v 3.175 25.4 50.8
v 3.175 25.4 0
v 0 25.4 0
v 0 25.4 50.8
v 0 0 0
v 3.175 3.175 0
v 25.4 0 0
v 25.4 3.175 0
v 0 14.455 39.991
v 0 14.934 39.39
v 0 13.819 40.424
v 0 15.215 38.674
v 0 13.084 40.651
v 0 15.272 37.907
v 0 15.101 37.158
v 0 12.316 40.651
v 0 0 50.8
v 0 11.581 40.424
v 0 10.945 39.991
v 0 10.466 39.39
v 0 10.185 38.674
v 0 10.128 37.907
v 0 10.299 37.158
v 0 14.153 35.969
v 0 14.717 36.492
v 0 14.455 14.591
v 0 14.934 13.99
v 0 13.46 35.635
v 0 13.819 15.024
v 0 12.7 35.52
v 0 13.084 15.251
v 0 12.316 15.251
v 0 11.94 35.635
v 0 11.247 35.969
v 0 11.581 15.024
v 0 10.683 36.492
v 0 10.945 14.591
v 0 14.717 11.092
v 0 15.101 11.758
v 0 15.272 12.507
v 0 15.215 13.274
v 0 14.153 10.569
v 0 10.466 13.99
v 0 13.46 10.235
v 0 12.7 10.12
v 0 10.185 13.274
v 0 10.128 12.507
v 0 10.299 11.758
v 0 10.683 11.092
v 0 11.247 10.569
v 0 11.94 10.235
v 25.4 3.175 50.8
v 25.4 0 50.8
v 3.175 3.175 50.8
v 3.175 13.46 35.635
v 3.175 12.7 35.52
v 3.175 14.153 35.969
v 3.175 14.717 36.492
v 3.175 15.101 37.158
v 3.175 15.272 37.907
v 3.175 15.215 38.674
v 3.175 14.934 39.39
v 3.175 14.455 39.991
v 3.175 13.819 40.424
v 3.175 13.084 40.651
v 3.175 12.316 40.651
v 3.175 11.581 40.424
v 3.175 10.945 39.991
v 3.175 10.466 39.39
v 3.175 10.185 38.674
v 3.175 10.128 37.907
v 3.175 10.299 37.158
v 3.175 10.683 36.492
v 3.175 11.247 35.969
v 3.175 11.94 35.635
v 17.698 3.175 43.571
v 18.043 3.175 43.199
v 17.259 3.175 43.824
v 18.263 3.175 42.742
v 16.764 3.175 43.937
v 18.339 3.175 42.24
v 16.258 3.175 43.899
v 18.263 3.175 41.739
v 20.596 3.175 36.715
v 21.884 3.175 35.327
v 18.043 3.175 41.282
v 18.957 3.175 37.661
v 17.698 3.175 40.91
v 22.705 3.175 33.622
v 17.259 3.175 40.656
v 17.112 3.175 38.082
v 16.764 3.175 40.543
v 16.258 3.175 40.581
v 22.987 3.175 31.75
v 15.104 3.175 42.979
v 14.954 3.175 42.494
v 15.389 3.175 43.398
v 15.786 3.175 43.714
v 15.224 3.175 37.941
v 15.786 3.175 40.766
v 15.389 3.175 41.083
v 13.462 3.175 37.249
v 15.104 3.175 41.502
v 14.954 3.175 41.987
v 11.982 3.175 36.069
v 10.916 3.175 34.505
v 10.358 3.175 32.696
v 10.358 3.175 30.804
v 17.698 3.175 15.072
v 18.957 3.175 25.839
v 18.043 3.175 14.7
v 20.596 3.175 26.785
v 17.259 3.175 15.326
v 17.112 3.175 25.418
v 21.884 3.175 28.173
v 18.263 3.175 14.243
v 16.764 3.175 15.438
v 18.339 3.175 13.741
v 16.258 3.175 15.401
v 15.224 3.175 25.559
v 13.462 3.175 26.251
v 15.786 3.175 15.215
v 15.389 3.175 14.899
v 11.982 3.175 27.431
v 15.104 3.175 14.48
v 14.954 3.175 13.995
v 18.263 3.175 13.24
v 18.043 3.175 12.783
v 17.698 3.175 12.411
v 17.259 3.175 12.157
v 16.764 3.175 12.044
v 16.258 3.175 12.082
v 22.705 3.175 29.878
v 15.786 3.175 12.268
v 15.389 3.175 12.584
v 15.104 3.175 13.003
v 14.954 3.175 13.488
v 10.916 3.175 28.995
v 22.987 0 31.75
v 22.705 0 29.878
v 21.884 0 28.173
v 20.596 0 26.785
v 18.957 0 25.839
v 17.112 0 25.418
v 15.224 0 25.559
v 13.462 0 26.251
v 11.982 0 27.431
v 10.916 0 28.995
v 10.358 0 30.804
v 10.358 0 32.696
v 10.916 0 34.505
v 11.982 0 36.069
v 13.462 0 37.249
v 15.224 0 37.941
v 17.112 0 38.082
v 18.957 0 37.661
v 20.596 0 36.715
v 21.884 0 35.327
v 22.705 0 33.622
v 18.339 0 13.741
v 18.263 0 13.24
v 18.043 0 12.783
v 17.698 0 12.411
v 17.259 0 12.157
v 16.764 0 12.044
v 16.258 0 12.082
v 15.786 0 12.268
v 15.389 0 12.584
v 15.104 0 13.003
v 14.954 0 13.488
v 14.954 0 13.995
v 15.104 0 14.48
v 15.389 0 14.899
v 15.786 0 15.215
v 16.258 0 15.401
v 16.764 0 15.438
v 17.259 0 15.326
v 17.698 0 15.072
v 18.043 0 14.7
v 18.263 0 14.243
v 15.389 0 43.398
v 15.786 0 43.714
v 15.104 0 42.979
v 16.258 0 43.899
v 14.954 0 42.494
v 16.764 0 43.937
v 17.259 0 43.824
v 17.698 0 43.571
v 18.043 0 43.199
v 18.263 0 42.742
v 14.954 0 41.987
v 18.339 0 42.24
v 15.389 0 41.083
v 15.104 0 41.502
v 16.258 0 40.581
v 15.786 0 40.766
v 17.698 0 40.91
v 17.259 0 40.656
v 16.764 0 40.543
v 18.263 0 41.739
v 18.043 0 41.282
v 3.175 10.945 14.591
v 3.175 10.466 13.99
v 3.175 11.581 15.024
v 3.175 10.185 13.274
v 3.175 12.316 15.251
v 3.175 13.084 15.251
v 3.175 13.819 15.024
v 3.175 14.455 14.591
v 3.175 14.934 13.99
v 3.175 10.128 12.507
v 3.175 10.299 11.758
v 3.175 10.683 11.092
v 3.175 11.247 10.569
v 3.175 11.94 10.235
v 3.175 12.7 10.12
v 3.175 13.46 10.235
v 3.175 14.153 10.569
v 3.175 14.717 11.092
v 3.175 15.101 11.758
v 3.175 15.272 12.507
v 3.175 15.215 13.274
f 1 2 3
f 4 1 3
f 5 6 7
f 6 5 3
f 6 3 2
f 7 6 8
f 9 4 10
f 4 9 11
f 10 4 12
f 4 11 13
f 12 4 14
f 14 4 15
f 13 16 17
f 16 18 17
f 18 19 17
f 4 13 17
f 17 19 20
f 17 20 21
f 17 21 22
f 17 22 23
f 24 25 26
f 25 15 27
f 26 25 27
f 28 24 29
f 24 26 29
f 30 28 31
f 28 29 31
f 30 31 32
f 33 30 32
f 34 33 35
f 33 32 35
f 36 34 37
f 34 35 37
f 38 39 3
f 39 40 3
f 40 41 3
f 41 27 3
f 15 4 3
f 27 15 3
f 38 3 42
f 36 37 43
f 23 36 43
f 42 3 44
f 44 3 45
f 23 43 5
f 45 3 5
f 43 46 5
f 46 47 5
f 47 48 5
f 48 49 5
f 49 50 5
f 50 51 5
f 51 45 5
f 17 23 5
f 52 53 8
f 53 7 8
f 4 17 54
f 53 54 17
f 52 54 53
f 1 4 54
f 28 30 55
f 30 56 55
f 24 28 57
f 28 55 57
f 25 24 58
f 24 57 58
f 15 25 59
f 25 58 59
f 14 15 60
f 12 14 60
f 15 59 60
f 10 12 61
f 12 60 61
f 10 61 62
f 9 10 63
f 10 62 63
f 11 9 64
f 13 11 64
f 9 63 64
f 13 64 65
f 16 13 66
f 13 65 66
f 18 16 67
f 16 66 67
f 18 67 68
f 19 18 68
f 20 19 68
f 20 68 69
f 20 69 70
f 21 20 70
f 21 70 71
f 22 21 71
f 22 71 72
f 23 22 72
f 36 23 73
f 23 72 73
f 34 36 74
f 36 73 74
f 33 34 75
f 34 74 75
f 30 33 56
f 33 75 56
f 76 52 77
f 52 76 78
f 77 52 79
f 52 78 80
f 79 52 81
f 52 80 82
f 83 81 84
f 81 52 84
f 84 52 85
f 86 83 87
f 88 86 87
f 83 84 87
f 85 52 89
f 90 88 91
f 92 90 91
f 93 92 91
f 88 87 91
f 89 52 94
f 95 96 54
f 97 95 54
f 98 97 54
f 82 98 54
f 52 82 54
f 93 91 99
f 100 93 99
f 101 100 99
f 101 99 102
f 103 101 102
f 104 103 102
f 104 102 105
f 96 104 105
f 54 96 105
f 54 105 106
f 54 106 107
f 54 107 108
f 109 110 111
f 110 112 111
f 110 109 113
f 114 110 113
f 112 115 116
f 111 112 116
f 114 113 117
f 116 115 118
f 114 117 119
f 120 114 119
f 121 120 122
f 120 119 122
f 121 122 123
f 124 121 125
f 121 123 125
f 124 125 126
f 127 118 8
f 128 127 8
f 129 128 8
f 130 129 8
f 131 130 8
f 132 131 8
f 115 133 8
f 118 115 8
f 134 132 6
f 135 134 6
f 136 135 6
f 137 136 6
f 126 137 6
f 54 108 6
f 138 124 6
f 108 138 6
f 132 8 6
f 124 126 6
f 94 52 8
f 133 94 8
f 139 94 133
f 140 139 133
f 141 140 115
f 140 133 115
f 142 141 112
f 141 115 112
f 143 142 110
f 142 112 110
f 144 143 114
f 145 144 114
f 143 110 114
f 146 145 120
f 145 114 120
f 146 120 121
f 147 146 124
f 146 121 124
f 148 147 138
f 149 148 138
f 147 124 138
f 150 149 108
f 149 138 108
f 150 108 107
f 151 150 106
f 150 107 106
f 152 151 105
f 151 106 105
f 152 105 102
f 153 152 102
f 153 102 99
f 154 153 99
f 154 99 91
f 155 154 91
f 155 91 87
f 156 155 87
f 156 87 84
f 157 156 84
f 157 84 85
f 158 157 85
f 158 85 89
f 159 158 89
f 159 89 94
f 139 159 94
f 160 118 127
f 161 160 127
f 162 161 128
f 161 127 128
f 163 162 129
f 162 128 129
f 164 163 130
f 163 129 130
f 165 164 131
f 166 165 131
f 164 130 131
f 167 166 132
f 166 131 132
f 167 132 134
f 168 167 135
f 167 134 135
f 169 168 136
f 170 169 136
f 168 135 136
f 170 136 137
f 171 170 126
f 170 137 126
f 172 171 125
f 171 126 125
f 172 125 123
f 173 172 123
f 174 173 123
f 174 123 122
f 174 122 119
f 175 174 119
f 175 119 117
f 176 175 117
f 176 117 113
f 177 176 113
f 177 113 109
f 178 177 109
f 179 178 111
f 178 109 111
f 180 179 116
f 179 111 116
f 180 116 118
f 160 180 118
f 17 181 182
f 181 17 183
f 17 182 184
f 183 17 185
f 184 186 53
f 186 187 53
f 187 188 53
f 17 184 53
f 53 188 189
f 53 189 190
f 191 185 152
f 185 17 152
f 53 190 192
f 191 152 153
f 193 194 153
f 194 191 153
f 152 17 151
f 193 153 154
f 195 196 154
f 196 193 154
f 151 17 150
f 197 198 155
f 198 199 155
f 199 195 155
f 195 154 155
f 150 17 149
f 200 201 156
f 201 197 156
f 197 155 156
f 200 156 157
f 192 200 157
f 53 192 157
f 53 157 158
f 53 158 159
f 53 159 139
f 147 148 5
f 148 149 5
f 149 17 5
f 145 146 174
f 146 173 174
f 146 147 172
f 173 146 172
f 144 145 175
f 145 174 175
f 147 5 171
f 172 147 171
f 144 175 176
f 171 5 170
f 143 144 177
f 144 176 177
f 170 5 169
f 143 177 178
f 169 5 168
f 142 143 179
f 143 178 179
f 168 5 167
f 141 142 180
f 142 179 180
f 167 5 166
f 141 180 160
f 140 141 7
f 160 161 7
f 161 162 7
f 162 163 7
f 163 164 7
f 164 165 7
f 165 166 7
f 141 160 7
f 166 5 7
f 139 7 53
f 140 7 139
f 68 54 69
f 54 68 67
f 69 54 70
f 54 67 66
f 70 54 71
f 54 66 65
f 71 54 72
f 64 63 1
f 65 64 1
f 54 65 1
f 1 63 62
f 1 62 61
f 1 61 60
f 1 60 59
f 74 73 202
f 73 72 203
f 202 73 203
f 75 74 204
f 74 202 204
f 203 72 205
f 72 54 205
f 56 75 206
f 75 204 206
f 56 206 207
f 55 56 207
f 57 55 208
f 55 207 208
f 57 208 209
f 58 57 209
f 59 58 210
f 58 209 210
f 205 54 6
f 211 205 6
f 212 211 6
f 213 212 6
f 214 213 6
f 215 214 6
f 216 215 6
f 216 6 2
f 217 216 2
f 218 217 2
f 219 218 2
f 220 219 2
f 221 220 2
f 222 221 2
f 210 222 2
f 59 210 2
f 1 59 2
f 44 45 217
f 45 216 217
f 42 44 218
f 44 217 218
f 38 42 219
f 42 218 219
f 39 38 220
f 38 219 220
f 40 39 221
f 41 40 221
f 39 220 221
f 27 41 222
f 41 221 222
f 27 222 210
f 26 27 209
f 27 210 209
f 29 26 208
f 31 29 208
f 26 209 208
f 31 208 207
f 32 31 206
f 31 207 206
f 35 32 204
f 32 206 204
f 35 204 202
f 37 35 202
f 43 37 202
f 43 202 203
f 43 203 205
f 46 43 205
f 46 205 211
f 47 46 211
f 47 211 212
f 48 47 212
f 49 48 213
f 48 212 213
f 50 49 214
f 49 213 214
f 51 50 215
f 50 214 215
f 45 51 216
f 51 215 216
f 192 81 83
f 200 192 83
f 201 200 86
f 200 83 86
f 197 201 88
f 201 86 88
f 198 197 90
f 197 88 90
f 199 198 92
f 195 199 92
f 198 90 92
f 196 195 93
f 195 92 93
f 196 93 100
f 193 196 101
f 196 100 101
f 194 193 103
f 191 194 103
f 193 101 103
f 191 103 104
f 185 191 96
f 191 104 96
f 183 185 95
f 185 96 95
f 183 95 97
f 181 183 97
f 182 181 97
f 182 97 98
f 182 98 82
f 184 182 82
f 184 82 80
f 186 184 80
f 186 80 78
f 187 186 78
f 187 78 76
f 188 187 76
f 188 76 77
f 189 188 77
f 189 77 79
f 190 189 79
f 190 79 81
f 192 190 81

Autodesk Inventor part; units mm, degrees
ref_plane "YZ Plane" through (0, 0, 0) normal (1, 0, 0) x (0, 1, 0)
ref_plane "XZ Plane" through (0, 0, 0) normal (0, 1, 0) x (-1, 0, 0)
ref_plane "XY Plane" through (0, 0, 0) normal (0, 0, 1) x (1, 0, 0)
sketch "Sketch1" plane through (0, 0, 0) normal (0, 0, 1) x (1, 0, 0)
  line L0 (0, 0) -> (3.175, 0)
  line L1 (3.175, 0) -> (3.175, 25.4)
  line L2 (3.175, 25.4) -> (0, 25.4)
  line L3 (0, 25.4) -> (0, 0)
  line L4 (0, 0) -> (25.4, 0)
  line L5 (25.4, 0) -> (25.4, 3.175)
  line L6 (25.4, 3.175) -> (0, 3.175)
  line L7 (0, 3.175) -> (0, 0)
  dimension "d0" = 3.175
  dimension "d1" = 25.4
  dimension "d2" = 25.4
  dimension "d3" = 3.175
extrude "Extrusion1" add sketch "Sketch1" along normal blind 50.8
sketch "Sketch2" plane through (3.175, 3.175, 0) normal (0, 1, 0) x (1, 0, 0)
  line L0 (-3.175, -50.8) -> (22.225, -50.8) construction
  line L1 (-3.175, -50.8) -> (13.462, -50.8) construction
  line L2 (13.462, -50.8) -> (13.462, -31.75) construction
  line L3 (13.462, -50.8) -> (32.512, -50.8) construction
  circle A0 centre (13.462, -31.75) radius 6.35
  point P0 (-3.175, 0)
  dimension "d6" = 16.637
  dimension "d7" = 19.05
  dimension "d8" = 90
  dimension "d9" = 12.7
extrude "Extrusion2" cut sketch "Sketch2" against normal blind 50.8
sketch "Sketch3" plane through (3.175, 3.175, 0) normal (0, 1, 0) x (1, 0, 0)
  circle A0 centre (13.462, -31.75) radius 6.35 construction
  line L0 (13.462, -31.75) -> (13.462, -42.2402) construction
  line L1 (13.462, -42.2402) -> (13.462, -13.7414) construction
  circle A1 centre (13.462, -42.2402) radius 1.7018
  circle A2 centre (13.462, -13.7414) radius 1.7018
  point P0 (-3.175, 0)
  dimension "d12" = 10.4902
  dimension "d13" = 28.4988
  dimension "d14" = 3.4036
  dimension "d15" = 3.4036
extrude "Extrusion3" cut sketch "Sketch3" against normal blind 50.8
sketch "Sketch4" plane through (3.175, 3.175, 0) normal (1, 0, 0) x (0, 0, -1)
  line L0 (0, 0) -> (0, 22.225) construction
  line L1 (0, 22.225) -> (-12.7, 22.225) construction
  line L2 (0, 22.225) -> (-50.8, 22.225) construction
  line L3 (-12.7, 22.225) -> (-12.7, 9.525) construction
  line L4 (-12.7, 9.525) -> (-38.1, 9.525) construction
  circle A0 centre (-12.7, 9.525) radius 2.5797
  circle A1 centre (-38.1, 9.525) radius 2.5797
  point P0 (0, -3.175)
  dimension "d18" = 12.7
  dimension "d19" = 12.7
  dimension "d20" = 25.4
  dimension "d21" = 5.1594
extrude "Extrusion4" cut sketch "Sketch4" against normal blind 50.8
properties part number "2in L-Bracket"
